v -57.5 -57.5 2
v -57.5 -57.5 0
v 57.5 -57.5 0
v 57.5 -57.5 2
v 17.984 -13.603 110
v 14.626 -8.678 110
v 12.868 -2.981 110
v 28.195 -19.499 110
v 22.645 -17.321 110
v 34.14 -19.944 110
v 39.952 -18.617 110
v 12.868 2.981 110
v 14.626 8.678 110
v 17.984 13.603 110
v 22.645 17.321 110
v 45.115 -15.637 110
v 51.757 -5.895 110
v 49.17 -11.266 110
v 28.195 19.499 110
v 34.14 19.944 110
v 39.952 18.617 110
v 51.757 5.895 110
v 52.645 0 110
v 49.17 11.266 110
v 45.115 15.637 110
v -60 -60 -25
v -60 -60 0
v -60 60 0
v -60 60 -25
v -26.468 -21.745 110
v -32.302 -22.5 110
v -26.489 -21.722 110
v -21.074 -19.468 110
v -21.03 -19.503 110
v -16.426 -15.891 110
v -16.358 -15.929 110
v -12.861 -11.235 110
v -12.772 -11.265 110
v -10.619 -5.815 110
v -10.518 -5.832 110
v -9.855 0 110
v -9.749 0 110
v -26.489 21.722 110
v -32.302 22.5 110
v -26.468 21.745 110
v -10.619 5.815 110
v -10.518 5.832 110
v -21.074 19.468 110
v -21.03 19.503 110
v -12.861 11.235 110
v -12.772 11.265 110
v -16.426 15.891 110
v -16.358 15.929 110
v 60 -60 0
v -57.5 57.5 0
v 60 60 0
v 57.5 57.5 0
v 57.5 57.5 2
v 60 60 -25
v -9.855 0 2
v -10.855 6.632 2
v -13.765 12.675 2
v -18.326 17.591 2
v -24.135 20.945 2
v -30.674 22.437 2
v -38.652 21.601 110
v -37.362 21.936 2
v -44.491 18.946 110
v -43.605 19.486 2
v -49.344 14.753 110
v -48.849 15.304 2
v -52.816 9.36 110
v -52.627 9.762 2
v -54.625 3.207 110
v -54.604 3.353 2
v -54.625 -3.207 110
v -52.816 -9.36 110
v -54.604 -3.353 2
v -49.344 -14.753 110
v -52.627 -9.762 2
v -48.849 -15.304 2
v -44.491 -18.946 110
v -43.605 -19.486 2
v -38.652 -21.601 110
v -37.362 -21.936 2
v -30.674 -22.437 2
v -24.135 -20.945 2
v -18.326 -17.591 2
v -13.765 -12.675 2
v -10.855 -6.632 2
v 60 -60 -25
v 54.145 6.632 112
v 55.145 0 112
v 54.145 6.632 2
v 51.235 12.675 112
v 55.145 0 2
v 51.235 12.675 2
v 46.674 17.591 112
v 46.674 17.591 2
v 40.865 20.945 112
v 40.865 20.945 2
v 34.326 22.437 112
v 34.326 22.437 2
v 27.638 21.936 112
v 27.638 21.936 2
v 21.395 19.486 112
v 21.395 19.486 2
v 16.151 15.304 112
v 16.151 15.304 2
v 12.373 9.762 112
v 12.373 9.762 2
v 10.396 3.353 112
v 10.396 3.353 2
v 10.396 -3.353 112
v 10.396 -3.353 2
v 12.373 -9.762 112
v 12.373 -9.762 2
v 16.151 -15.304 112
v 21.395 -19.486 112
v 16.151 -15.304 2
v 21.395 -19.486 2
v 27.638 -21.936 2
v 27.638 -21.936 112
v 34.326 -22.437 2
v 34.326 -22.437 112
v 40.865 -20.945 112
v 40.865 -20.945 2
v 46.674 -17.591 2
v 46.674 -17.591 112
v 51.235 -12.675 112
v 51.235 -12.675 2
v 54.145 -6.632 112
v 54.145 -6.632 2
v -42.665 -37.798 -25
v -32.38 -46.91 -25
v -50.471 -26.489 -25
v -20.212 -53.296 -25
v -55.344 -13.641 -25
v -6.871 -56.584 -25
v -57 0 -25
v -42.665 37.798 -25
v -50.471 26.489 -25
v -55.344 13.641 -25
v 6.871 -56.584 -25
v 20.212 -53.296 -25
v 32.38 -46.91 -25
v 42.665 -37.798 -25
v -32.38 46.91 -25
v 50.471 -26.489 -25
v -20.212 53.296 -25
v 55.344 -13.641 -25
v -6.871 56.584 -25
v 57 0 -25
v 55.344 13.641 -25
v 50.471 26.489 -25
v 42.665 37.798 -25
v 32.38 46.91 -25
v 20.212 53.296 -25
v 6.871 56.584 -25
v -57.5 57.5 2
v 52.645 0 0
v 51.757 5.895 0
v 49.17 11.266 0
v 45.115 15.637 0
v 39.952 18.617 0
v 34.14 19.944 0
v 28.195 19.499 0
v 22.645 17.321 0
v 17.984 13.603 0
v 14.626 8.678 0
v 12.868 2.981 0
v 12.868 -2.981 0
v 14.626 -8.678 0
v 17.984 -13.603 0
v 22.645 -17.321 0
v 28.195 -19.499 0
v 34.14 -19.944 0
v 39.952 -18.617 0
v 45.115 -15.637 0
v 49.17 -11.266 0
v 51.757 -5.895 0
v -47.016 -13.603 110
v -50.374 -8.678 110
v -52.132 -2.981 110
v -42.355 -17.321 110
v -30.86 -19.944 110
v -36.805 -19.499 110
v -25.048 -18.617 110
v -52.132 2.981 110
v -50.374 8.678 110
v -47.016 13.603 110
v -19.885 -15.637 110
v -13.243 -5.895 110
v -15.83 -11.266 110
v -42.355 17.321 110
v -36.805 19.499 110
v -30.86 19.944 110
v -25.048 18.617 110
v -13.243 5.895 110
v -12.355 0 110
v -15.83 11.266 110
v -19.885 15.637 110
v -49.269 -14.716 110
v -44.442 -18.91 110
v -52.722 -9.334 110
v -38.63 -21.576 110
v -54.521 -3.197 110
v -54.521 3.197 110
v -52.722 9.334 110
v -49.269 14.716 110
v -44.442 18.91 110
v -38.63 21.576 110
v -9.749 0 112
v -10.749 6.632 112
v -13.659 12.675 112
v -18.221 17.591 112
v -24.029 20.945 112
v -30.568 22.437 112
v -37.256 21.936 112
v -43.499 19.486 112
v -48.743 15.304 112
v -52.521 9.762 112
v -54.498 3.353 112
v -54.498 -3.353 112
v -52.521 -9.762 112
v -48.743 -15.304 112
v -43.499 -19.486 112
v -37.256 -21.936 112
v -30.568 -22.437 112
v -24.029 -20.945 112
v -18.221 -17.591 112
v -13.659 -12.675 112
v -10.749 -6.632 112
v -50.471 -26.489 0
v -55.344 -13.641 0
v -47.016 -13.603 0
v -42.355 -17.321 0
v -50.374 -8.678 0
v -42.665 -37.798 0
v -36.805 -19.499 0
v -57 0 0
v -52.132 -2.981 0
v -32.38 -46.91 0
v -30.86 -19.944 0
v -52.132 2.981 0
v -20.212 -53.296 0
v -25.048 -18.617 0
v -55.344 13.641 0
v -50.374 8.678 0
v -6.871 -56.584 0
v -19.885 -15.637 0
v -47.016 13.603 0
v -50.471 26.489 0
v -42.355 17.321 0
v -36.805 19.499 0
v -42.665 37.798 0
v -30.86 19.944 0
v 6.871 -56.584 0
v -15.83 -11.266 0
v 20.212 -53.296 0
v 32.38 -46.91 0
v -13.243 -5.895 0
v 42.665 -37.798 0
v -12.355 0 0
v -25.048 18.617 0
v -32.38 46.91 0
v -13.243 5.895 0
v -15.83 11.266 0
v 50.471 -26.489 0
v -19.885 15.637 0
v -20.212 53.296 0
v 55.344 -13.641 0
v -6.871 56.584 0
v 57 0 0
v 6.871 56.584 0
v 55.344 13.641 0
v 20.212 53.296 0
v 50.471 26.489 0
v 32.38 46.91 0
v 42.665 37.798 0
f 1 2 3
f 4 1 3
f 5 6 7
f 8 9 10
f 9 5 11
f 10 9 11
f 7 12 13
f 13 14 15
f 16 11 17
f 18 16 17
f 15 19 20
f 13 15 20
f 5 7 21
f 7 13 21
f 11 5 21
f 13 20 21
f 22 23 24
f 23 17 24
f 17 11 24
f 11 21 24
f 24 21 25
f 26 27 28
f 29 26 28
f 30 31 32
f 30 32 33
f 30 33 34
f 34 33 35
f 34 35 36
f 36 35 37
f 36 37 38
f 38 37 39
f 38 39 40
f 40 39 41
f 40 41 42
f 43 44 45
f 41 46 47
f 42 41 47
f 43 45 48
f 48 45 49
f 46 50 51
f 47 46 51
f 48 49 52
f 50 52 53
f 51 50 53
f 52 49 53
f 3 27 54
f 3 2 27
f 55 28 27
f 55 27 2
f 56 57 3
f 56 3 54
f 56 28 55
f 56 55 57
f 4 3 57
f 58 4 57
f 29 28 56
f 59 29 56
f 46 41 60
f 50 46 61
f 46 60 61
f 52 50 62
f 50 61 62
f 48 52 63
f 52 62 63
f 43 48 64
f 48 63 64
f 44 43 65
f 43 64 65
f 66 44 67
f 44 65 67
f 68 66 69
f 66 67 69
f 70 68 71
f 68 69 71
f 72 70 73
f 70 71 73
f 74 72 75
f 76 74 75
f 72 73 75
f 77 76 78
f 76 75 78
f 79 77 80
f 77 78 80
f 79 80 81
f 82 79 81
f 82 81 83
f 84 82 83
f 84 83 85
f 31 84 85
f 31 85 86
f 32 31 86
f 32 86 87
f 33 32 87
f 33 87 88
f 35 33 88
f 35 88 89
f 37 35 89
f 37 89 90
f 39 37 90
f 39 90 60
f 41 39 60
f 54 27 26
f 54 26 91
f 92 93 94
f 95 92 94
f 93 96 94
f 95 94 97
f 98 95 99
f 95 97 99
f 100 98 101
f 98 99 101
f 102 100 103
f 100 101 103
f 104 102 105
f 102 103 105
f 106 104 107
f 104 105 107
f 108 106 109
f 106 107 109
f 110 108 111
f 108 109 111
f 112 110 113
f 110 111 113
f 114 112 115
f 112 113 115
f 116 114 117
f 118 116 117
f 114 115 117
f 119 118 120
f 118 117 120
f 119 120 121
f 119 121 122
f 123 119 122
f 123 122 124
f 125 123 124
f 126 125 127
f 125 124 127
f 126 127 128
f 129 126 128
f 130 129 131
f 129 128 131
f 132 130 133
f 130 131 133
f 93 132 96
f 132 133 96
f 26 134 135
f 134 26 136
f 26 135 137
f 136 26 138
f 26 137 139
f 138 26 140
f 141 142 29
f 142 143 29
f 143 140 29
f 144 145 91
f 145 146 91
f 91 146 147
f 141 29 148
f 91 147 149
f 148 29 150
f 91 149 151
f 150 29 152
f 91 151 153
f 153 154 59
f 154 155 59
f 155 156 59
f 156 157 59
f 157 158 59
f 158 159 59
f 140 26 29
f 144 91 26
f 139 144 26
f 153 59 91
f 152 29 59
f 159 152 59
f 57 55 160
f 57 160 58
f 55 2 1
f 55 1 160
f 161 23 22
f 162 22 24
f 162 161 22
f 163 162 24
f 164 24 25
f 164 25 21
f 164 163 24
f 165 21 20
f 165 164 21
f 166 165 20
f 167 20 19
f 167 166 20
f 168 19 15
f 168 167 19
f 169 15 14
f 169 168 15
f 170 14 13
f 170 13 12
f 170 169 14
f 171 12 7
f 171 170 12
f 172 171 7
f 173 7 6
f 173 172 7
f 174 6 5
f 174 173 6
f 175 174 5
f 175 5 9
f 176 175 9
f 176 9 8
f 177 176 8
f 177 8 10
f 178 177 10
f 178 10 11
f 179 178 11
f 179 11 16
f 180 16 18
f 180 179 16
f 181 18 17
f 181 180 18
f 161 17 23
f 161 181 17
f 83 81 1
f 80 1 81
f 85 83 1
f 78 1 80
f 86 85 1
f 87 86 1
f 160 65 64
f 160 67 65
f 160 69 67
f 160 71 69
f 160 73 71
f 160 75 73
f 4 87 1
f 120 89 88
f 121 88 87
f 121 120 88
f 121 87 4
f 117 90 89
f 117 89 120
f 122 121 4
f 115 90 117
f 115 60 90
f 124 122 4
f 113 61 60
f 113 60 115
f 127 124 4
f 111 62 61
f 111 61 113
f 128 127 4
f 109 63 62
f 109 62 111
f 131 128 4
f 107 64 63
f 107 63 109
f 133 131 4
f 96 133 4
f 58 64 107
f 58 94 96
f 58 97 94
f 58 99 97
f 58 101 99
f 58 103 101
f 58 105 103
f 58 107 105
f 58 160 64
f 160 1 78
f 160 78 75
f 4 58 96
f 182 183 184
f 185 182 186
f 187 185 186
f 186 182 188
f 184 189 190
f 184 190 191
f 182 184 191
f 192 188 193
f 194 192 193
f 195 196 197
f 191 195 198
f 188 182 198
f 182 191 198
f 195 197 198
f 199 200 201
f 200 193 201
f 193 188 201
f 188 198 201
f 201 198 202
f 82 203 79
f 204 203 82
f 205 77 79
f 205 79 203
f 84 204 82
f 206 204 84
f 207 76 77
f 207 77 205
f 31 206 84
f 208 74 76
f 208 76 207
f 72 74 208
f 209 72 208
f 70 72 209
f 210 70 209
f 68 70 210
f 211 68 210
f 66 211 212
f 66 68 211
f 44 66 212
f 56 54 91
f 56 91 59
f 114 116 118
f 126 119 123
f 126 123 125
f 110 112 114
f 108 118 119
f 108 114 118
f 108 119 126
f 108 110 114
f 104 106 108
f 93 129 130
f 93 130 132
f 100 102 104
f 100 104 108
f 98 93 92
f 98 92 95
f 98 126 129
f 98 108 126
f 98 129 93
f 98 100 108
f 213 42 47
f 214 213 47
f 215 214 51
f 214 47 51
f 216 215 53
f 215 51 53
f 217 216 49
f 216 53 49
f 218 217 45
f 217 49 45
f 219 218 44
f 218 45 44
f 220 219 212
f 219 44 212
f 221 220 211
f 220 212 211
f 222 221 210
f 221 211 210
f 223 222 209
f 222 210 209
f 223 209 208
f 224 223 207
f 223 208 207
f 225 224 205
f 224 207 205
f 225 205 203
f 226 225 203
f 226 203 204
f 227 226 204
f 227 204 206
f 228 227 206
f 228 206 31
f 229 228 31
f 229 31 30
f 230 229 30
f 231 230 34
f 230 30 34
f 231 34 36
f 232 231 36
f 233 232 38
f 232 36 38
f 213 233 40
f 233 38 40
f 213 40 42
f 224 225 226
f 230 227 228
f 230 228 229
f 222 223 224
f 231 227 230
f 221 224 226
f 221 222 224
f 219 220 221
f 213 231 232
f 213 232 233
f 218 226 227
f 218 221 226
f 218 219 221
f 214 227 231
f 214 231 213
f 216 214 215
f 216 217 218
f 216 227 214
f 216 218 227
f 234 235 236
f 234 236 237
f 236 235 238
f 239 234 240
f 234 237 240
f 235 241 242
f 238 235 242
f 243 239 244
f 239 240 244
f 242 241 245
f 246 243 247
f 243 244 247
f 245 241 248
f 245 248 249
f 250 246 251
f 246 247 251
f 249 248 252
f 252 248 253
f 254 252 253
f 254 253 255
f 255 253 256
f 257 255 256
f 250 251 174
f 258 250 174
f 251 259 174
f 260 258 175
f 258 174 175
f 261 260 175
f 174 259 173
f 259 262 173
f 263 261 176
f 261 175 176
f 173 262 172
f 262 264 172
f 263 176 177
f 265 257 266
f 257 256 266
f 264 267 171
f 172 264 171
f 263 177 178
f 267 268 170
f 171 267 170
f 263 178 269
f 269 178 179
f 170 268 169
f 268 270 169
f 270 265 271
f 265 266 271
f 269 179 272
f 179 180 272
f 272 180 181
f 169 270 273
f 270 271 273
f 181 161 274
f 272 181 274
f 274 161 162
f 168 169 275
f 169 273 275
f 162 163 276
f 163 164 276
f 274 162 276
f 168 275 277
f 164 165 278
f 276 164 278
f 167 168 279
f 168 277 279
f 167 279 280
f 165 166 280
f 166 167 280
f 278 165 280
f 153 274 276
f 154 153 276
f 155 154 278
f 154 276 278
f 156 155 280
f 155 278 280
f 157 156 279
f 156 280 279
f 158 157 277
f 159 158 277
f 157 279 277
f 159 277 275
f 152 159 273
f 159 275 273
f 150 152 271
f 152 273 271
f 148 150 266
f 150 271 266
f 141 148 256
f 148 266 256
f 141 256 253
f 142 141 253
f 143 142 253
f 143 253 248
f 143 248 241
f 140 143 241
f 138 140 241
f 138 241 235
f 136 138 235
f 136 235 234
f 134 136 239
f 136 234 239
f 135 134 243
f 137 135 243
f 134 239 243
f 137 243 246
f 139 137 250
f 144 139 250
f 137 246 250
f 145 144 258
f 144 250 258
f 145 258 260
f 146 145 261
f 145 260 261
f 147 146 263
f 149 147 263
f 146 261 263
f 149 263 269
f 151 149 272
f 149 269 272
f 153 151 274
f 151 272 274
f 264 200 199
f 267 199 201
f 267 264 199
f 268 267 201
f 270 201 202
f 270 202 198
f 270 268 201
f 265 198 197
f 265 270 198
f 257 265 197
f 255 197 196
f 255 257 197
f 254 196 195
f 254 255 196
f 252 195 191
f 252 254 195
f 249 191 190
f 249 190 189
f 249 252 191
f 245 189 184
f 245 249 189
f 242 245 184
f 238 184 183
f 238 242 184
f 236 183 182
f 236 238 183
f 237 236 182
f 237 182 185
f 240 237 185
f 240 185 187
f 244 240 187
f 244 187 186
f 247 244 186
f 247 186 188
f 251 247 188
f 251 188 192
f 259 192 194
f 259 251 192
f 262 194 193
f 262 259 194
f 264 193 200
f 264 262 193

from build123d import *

# Parameters (mm, degrees)
F0_W     = 120
F0_H     = 120
F0_R     = 57
F1_DEPTH = 25
F2_W     = 115
F2_H     = 115
F2_R     = 22.5
F3_DEPTH = 2
F2_R_2   = 20
F4_DEPTH = 110
F5_R     = 22.5
F5_R_2   = 20
F6_DEPTH = 2


with BuildPart() as f1:
    # F0 (on Top) → F1 (new body)
    with BuildSketch(Plane.XY):
        Rectangle(F0_W, F0_H)
        Circle(F0_R, mode=Mode.SUBTRACT)
    extrude(amount=-F1_DEPTH)

    # F2 (on Top) → F3 (join)
    with BuildSketch(Plane.XY):
        Rectangle(F2_W, F2_H)
        with Locations((-32.354934313, 0)):
            Circle(F2_R, mode=Mode.SUBTRACT)
        with Locations((32.645065687, 0)):
            Circle(F2_R, mode=Mode.SUBTRACT)
    extrude(amount=F3_DEPTH)

    # F2 (on Top) → F4 (join)
    with BuildSketch(Plane.XY):
        with Locations((-32.354934313, 0)):
            Circle(F2_R)
        with Locations((-32.354934313, 0)):
            Circle(F2_R_2, mode=Mode.SUBTRACT)
        with Locations((32.645065687, 0)):
            Circle(F2_R)
        with Locations((32.645065687, 0)):
            Circle(F2_R_2, mode=Mode.SUBTRACT)
    extrude(amount=F4_DEPTH)

    # F5 (on face) → F6 (join)
    with BuildSketch(Plane.XY.offset(110)):
        with Locations((32.645065687, 0)):
            Circle(F5_R)
        with Locations((32.645065687, 0)):
            Circle(F5_R_2, mode=Mode.SUBTRACT)
        with Locations((-32.2491377592, 0)):
            Circle(F5_R)
        with Locations((32.645065687, 0)):
            Circle(F5_R_2)
    extrude(amount=F6_DEPTH)


solid = f1.part
